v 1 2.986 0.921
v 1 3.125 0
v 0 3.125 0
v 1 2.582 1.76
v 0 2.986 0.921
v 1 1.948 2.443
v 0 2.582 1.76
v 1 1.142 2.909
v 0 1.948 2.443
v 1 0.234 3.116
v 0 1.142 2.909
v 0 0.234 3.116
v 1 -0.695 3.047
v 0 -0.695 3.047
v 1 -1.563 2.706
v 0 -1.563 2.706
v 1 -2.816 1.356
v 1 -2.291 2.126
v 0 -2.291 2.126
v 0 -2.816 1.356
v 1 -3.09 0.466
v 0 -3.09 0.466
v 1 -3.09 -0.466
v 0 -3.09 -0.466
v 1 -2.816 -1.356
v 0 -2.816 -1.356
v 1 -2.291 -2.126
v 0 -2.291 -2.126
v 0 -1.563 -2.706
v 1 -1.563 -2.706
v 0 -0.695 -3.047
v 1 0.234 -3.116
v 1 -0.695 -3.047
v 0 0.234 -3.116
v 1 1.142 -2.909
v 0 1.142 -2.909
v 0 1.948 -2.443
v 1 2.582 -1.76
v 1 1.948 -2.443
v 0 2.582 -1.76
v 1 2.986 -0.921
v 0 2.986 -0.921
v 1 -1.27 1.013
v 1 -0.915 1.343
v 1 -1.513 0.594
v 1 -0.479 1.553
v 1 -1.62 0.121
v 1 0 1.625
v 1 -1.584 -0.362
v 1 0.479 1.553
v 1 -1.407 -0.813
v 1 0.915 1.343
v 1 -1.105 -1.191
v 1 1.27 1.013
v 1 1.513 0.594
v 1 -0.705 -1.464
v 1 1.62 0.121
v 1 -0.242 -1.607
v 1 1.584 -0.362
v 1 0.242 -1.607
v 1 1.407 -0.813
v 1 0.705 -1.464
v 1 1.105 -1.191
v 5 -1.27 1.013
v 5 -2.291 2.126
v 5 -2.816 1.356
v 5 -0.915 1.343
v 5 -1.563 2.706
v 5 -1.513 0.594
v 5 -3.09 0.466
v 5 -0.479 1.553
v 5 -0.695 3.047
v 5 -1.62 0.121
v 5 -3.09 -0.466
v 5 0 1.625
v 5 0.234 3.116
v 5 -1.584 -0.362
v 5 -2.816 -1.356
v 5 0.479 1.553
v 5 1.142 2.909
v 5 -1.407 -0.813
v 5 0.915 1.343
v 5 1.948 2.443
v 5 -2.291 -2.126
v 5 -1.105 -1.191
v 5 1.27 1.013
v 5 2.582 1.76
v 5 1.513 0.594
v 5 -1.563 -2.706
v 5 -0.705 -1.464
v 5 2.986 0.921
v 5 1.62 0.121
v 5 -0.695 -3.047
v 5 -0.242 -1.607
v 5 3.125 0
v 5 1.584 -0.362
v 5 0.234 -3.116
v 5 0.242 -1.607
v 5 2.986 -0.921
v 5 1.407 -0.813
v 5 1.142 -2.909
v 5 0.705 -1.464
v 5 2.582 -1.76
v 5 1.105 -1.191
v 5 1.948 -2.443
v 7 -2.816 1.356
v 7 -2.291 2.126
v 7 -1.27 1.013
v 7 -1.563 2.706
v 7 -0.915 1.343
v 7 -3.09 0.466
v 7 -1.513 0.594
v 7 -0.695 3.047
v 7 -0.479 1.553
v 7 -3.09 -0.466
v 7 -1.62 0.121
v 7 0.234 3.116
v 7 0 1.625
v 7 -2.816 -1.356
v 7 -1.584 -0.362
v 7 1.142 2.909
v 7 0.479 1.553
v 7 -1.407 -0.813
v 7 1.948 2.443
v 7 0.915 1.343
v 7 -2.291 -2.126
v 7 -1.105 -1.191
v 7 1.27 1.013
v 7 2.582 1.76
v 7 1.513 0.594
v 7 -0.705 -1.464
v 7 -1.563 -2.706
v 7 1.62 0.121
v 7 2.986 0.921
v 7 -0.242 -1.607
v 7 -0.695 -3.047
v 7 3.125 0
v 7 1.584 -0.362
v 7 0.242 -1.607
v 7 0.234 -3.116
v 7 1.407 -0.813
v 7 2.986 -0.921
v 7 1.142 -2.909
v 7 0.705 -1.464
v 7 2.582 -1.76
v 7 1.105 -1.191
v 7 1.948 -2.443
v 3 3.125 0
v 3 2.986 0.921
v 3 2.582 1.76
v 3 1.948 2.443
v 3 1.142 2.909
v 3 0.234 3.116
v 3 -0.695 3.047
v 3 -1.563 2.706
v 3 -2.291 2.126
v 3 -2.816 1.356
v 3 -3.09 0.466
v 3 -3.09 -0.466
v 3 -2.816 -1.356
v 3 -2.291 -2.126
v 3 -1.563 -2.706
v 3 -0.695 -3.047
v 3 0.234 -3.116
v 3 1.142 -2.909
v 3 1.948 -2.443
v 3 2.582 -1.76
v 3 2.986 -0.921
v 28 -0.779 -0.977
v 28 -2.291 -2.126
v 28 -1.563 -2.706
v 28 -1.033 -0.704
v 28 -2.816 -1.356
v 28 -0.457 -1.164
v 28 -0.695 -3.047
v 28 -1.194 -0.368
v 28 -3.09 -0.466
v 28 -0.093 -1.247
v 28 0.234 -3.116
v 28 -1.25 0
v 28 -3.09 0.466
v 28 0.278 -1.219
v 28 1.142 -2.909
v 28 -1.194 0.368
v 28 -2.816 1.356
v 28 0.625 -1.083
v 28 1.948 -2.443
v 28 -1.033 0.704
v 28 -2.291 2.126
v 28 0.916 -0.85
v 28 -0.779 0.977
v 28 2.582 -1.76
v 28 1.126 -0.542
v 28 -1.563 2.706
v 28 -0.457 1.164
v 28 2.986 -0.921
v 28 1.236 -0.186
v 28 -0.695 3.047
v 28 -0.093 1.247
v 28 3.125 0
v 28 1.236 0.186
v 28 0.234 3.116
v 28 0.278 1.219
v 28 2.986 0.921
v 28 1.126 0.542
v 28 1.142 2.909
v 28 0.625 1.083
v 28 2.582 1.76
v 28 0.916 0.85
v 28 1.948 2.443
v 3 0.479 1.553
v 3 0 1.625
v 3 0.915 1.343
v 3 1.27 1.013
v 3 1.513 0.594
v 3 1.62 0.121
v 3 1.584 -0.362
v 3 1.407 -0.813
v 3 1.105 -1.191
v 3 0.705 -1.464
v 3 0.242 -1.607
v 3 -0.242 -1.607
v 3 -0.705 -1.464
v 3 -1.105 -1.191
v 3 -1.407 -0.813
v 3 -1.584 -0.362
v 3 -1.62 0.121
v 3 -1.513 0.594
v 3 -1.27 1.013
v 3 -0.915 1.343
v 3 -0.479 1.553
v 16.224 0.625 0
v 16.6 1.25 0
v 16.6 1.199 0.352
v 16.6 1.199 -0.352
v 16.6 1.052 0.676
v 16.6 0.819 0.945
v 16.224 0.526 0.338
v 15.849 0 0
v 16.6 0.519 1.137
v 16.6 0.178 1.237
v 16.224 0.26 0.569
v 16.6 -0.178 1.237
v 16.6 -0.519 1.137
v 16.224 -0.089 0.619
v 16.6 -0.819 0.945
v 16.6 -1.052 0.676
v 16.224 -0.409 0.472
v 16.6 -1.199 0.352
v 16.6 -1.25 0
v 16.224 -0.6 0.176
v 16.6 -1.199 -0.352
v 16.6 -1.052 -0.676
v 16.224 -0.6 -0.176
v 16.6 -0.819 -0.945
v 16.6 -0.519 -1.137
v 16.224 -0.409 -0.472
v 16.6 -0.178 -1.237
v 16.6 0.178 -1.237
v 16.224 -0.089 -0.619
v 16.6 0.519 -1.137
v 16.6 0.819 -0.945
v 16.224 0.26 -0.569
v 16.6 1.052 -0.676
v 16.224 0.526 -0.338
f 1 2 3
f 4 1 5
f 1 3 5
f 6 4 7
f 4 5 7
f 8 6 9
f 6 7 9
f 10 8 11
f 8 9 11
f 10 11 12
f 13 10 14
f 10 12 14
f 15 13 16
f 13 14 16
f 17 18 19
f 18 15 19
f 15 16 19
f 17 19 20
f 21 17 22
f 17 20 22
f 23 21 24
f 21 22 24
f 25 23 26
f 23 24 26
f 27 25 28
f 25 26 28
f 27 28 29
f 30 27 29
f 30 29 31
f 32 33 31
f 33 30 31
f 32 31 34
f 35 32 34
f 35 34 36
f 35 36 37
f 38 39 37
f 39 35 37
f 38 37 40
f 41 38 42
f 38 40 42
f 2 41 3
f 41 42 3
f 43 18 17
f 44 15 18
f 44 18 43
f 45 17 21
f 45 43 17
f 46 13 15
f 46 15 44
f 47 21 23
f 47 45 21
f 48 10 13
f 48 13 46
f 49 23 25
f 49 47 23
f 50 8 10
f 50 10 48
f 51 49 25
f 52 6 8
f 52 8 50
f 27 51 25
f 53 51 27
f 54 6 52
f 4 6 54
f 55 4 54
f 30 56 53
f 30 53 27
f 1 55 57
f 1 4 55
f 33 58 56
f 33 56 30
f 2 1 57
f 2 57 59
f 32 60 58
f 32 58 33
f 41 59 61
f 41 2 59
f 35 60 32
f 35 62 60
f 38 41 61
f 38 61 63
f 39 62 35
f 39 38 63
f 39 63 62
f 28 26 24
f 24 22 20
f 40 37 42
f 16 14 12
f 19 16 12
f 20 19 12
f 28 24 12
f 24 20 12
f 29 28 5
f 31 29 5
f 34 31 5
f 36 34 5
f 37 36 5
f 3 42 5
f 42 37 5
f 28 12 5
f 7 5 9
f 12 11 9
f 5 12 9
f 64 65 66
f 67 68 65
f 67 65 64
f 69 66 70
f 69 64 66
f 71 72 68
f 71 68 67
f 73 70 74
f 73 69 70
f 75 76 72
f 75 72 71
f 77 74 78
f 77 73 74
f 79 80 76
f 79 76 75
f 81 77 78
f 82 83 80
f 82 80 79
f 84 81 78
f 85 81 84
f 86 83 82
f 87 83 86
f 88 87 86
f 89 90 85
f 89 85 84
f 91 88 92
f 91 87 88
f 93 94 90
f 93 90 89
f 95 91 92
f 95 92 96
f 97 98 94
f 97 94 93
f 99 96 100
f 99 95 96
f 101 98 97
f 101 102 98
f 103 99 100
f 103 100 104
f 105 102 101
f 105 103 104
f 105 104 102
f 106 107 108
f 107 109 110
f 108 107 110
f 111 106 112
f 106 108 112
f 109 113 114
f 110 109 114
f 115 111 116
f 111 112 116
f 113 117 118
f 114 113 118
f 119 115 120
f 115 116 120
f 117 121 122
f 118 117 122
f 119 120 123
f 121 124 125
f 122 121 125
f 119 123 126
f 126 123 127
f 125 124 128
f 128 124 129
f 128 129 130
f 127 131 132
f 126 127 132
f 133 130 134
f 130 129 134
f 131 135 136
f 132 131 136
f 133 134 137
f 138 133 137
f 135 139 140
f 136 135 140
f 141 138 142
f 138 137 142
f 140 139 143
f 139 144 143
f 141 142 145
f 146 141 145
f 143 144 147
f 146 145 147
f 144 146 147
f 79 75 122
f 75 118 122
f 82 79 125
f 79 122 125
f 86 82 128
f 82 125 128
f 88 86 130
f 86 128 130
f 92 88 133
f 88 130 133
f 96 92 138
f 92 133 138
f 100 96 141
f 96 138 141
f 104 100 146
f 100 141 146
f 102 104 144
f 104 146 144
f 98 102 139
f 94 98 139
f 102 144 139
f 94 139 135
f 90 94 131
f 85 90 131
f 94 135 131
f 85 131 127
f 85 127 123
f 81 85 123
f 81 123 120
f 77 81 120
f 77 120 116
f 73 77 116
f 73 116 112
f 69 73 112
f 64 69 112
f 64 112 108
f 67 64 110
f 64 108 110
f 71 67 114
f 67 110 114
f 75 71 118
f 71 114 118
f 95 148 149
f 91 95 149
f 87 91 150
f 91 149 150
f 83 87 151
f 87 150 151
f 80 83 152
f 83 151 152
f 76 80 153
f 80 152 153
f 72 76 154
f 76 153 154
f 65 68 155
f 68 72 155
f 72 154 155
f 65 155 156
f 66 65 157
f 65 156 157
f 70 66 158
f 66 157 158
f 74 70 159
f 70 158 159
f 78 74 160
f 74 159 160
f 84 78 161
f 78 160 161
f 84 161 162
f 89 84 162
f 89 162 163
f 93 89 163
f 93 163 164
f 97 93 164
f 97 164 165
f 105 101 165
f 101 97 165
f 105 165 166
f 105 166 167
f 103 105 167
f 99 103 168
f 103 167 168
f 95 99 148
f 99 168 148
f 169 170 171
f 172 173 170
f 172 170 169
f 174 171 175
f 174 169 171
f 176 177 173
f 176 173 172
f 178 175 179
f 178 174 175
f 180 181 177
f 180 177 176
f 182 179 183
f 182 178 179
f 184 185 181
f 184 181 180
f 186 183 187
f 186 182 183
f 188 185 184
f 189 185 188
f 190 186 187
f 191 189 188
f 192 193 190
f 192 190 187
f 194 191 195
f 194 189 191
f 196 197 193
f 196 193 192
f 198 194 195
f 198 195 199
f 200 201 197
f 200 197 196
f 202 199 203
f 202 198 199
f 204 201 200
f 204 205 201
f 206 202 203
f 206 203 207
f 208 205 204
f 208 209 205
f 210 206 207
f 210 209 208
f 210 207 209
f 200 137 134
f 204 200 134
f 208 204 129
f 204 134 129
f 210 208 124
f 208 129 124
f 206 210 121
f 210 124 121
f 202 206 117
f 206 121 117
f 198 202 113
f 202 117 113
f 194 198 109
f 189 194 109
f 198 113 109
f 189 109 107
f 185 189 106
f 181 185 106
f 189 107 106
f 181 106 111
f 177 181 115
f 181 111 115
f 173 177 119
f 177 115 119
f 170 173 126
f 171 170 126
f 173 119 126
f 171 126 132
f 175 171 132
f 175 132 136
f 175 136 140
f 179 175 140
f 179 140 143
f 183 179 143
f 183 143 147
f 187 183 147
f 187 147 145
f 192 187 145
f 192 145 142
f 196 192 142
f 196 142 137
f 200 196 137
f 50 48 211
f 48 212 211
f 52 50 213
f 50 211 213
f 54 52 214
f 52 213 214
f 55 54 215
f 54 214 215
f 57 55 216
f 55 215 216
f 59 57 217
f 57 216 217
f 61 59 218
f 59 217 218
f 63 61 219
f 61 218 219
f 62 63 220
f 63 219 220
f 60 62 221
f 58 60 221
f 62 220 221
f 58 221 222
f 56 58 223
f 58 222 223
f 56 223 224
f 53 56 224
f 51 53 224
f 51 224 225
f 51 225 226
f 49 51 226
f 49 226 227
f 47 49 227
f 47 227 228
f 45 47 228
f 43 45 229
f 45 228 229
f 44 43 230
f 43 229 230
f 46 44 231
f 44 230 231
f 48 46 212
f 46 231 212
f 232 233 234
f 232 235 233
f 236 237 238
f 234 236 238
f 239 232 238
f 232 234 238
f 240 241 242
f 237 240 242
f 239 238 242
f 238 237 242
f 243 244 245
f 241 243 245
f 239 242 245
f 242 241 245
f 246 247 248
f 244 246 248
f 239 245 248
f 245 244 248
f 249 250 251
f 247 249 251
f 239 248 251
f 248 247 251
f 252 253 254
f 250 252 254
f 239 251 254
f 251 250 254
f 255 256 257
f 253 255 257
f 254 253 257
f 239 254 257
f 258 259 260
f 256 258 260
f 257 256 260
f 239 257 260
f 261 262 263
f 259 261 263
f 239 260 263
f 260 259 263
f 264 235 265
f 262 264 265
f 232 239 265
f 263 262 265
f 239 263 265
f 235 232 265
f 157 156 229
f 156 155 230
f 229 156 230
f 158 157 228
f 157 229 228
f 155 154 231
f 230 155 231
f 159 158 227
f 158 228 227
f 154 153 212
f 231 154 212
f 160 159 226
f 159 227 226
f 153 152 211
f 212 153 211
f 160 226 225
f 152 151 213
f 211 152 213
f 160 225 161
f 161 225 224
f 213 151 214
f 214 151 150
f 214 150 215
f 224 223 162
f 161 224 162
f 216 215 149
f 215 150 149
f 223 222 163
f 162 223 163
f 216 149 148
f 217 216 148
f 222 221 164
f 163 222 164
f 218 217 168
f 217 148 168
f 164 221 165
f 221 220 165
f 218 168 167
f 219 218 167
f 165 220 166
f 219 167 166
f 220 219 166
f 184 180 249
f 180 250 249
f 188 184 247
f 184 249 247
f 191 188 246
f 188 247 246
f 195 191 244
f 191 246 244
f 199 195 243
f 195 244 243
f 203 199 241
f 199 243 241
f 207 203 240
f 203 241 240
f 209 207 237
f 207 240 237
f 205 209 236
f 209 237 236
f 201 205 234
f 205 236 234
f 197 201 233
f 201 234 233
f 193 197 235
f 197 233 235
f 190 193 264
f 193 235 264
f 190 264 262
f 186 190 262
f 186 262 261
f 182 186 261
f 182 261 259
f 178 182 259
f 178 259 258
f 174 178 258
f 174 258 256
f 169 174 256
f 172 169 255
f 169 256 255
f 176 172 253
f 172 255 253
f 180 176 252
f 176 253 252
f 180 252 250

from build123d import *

# Parameters (mm, degrees)
F0_R     = 3.125
F1_DEPTH = 28
F2_W     = 2
F2_H     = 5.1480256068
F5_D     = 2.5
F5_DEPTH = 11.4
F5_TIP   = 0.7510757738


with BuildPart() as f1:
    # F0 (on Right) → F1 (new body)
    with BuildSketch(Plane.YZ):
        Circle(F0_R)
    extrude(amount=F1_DEPTH)

    # F2 (on Front) → F3 (revolve, cut)
    with BuildSketch(Plane.XZ):
        with Locations((2, 4.1990128034)):
            Rectangle(F2_W, F2_H)
        with Locations((6, 4.1990128034)):
            Rectangle(F2_W, F2_H)
    revolve(axis=Axis((0, 0, 0), (-1, 0, 0)), mode=Mode.SUBTRACT)

    # F5
    with Locations(Plane.YZ.offset(28)):
        with Locations((0, 0)):
            Hole(F5_D / 2, depth=F5_DEPTH)
            with Locations((0, 0, -(F5_DEPTH + F5_TIP / 2))):  # 118° drill point
                Cone(0, F5_D / 2, F5_TIP, mode=Mode.SUBTRACT)


solid = f1.part
